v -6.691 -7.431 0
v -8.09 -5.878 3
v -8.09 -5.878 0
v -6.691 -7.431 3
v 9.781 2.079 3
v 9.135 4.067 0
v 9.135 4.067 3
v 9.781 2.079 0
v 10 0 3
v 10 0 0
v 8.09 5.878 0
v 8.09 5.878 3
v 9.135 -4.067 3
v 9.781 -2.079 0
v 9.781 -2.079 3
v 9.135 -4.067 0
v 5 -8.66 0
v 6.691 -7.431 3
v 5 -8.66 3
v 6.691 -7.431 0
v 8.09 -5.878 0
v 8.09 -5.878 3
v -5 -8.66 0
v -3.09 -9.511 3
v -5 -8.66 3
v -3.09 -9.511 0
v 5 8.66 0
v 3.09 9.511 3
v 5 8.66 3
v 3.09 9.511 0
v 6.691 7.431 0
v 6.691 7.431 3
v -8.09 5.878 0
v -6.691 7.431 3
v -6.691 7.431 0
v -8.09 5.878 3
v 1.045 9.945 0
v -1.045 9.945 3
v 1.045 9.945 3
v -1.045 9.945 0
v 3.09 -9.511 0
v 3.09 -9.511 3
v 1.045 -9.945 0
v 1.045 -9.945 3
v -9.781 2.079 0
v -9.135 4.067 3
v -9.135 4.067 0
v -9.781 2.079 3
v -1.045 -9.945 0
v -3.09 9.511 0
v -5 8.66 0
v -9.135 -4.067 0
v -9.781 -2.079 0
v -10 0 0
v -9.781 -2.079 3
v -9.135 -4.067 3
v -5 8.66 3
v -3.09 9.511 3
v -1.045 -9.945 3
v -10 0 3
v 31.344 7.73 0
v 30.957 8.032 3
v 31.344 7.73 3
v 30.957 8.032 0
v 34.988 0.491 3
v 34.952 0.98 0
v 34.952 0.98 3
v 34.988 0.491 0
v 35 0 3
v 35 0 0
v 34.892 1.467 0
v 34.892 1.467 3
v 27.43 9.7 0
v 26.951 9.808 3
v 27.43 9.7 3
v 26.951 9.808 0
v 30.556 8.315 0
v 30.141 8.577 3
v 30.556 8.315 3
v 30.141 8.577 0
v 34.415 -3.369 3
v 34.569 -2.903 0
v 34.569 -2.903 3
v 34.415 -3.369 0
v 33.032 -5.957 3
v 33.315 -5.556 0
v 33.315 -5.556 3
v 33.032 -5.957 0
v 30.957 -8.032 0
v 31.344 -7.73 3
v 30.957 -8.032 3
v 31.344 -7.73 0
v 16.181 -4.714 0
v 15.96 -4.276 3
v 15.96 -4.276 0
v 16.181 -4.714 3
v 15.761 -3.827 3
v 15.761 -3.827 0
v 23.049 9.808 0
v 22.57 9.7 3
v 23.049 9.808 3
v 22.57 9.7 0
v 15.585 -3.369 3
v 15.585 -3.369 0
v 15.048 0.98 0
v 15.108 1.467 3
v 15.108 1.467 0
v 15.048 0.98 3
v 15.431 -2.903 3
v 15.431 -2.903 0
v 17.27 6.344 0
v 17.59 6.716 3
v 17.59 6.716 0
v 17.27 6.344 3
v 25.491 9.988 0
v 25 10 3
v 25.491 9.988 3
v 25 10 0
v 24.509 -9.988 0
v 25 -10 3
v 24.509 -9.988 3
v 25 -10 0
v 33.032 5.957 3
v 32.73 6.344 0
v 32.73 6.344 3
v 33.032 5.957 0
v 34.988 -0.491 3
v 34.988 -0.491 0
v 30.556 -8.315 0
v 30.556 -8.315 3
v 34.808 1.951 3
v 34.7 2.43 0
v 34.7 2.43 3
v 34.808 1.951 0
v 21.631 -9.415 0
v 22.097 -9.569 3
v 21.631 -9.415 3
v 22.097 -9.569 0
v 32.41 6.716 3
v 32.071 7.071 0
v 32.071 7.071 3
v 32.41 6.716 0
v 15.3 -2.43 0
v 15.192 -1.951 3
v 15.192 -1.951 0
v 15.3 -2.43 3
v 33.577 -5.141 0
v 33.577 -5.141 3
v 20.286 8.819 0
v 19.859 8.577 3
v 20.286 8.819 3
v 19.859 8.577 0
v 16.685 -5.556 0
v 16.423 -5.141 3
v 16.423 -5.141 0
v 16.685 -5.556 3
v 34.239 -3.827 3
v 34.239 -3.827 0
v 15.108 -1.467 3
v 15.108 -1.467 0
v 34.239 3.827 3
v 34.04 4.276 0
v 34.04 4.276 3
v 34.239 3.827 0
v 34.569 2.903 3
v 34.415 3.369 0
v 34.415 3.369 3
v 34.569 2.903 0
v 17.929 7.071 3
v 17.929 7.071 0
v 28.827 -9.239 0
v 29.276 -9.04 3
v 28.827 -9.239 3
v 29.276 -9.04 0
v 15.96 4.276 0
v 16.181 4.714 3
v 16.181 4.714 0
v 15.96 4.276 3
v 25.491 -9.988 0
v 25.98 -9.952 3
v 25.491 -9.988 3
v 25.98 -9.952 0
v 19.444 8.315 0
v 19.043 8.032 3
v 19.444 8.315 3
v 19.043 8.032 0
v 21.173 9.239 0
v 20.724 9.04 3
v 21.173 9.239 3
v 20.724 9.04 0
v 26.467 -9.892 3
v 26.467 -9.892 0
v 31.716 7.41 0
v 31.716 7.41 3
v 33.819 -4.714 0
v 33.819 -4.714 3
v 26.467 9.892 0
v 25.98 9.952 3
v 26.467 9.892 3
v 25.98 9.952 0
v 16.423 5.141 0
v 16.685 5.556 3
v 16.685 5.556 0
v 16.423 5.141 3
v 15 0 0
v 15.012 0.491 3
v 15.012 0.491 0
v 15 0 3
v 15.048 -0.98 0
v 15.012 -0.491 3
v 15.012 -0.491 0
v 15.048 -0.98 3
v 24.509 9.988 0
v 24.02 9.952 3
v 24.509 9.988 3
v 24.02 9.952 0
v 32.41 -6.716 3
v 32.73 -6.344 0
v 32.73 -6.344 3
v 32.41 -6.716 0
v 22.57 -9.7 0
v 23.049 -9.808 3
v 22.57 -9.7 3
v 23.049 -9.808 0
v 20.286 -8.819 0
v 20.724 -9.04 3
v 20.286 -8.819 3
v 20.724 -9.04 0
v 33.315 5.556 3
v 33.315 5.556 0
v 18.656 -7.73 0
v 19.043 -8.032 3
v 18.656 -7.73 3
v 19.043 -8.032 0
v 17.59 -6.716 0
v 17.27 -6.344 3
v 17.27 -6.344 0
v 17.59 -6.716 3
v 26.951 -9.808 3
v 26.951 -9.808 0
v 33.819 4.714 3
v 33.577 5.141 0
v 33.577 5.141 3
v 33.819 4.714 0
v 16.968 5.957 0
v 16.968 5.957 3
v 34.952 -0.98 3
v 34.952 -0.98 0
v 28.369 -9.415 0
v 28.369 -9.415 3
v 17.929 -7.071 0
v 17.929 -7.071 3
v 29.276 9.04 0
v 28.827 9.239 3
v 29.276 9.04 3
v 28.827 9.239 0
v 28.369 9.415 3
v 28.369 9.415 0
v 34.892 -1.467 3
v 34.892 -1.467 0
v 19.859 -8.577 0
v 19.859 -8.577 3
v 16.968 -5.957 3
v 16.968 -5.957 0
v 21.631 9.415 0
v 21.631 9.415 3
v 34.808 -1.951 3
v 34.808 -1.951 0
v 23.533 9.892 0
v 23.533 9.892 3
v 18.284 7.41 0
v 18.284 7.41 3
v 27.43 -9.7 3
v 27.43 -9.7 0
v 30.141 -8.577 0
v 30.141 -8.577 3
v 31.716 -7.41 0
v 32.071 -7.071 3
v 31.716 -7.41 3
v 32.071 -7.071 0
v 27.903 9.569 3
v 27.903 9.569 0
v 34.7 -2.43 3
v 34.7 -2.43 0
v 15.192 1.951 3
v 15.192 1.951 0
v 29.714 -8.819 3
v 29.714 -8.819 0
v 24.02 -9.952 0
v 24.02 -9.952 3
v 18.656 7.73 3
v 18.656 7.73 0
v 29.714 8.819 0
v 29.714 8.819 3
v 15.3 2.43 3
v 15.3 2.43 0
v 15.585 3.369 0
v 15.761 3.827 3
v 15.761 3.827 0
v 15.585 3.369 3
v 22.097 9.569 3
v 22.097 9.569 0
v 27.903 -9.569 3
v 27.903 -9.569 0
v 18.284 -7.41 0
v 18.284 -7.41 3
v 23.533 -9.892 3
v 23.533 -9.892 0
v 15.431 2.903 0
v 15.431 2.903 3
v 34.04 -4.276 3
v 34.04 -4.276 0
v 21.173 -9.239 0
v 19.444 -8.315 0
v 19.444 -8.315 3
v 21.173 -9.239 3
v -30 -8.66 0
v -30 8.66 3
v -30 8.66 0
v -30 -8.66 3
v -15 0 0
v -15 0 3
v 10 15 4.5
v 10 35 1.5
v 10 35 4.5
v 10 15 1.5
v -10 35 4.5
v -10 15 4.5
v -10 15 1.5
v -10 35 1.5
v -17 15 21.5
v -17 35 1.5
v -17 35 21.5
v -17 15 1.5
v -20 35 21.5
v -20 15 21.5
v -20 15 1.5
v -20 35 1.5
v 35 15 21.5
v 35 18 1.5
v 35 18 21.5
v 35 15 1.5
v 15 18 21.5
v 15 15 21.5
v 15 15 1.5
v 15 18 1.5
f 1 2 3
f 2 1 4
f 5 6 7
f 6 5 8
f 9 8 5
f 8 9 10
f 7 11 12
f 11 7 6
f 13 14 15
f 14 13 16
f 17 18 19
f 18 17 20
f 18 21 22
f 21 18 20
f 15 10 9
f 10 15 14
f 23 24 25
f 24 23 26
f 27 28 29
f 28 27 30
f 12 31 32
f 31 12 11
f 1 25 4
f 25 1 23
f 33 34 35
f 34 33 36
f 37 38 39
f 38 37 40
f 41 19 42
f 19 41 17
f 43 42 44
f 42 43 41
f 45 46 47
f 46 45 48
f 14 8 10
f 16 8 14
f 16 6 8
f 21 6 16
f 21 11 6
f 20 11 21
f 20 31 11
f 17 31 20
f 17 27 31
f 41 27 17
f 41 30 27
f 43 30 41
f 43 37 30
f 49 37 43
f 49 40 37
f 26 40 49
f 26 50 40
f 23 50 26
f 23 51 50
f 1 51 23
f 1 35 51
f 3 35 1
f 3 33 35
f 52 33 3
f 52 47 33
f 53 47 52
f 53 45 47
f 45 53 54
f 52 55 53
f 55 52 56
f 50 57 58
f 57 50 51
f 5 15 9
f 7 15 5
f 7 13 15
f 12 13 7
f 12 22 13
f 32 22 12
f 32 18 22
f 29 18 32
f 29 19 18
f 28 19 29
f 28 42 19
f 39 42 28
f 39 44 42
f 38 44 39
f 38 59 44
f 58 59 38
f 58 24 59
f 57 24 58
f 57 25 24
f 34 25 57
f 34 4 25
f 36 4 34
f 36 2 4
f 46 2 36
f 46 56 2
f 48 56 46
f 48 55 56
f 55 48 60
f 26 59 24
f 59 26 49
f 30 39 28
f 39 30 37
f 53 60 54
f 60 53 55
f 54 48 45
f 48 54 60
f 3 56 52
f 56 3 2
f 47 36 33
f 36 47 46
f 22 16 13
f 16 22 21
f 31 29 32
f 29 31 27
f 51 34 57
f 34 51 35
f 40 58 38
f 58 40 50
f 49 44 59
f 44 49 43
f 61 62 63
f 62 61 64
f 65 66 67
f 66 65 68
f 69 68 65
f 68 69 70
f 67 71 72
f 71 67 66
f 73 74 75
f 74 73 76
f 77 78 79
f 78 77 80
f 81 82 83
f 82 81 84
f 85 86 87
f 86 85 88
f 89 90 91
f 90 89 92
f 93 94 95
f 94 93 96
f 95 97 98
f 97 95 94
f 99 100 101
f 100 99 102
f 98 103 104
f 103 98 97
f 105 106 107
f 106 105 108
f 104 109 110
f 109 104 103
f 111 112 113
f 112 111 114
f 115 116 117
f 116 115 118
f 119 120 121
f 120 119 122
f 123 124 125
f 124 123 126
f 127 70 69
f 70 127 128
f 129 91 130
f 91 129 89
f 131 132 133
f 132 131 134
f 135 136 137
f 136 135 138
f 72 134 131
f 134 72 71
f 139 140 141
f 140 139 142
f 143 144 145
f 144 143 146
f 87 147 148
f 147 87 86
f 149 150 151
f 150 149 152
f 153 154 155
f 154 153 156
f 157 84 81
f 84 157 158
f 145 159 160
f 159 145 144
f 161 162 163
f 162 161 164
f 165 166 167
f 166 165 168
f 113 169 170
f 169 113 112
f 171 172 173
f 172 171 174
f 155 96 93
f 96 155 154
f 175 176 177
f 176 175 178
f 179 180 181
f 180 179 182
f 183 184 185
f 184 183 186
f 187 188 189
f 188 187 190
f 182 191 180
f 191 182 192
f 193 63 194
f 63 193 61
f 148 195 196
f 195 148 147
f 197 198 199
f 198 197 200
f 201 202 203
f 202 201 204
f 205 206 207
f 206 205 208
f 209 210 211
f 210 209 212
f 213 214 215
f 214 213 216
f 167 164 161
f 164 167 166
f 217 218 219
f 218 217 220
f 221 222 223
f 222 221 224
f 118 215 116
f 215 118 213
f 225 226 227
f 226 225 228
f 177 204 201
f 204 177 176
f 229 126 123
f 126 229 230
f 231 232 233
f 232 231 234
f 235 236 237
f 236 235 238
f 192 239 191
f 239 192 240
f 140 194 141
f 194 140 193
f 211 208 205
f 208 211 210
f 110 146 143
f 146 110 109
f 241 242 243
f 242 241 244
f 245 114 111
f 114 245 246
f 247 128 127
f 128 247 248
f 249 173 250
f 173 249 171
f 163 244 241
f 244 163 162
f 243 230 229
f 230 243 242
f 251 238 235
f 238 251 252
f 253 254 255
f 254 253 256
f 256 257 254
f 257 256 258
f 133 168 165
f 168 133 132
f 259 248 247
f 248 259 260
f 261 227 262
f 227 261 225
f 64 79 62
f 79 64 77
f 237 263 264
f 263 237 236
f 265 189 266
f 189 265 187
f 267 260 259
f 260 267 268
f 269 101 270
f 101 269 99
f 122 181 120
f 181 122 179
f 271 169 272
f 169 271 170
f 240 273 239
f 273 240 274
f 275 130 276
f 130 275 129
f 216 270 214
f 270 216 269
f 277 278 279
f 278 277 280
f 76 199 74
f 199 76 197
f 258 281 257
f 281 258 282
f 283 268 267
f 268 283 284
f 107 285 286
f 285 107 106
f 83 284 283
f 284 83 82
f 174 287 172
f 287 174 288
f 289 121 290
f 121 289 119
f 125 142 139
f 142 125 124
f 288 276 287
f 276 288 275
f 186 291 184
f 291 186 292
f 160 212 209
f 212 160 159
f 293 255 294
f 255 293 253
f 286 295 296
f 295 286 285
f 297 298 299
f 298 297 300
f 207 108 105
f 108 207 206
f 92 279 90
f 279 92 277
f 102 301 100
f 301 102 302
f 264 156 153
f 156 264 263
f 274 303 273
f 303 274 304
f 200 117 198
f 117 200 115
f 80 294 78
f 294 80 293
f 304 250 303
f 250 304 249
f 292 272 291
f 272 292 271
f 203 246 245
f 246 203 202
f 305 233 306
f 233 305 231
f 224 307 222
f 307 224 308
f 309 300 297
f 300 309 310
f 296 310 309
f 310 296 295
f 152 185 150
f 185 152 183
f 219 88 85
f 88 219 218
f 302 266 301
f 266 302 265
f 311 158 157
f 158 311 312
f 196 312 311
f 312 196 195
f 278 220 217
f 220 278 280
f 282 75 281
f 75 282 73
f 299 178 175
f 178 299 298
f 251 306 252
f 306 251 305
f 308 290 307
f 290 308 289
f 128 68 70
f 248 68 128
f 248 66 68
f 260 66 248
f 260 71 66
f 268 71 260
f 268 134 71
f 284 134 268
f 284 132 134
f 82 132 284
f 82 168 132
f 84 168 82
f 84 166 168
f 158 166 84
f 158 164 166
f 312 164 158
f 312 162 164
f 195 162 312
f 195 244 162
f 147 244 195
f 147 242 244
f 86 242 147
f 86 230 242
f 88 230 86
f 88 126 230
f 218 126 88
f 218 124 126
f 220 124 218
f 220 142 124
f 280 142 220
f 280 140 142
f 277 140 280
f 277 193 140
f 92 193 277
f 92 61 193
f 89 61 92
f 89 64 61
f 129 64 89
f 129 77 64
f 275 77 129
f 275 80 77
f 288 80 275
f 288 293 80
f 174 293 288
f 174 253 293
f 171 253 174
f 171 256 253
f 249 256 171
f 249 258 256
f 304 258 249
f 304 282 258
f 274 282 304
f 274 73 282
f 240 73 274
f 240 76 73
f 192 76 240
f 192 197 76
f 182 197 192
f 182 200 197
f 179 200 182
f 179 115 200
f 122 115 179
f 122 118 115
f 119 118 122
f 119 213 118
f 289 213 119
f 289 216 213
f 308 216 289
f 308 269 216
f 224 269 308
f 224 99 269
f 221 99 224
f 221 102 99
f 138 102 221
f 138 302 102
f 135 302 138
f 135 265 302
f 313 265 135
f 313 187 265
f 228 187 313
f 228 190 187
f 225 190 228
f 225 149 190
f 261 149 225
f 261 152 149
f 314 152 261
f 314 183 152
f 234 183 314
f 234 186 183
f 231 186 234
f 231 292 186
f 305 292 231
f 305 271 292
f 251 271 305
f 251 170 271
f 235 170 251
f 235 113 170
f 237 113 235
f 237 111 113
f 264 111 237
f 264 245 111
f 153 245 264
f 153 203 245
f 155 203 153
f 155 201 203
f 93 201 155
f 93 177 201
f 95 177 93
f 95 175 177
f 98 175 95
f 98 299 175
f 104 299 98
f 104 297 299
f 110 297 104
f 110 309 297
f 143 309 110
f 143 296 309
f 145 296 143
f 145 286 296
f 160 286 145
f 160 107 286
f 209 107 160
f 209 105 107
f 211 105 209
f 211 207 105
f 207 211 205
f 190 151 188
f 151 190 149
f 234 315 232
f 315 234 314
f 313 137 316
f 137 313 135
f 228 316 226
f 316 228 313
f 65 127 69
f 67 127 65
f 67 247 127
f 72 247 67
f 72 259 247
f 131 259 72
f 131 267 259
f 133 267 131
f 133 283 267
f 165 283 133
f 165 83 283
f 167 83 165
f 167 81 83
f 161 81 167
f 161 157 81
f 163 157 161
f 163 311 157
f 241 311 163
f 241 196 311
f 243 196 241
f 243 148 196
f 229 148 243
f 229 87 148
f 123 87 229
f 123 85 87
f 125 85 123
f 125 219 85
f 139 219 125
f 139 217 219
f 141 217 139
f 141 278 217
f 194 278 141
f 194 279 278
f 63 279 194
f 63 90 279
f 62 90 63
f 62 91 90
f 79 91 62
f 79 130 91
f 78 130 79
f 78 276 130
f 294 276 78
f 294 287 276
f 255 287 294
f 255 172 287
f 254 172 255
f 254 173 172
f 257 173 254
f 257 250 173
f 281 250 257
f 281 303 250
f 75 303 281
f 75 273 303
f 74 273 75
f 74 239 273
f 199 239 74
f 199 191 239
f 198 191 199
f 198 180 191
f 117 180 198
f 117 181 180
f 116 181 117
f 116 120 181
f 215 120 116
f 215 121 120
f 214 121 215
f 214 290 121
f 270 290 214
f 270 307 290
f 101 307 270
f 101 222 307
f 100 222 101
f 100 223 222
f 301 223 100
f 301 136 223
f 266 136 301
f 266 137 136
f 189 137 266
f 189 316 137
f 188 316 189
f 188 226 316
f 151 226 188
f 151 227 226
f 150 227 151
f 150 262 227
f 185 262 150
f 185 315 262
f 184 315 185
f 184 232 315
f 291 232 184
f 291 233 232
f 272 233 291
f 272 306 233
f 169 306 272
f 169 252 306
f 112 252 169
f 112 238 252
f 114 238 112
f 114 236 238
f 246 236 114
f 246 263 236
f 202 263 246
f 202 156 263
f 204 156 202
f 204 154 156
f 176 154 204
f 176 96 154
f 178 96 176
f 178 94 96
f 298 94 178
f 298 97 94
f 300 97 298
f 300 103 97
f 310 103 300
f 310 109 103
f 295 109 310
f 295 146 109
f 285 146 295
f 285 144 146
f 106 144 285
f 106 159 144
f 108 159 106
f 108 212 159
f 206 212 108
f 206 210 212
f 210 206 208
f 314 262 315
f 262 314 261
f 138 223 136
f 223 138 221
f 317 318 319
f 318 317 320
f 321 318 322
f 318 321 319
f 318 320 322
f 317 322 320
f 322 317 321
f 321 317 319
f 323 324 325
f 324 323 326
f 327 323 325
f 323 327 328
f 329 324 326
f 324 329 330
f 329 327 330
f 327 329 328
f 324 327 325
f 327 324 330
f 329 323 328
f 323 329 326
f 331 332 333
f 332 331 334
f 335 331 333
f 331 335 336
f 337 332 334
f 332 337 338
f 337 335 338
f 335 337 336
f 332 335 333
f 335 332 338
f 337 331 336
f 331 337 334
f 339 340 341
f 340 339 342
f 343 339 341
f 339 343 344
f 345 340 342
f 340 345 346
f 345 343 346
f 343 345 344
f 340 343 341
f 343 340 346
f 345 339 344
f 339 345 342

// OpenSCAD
// basic shapes

// numbers used for size are interpreted by most printers as millimeters
thickness = 3; // variable to create 3mm thick pieces
diameter = 20; // 20mm circles

// $fn is the variable for circles that determine how many 'facets' 
// are displayed.  Default is 10. 128 makes smoother circles
fn = 128;


// default $fn - circle is not super smooth
cylinder(d=20, h=thickness);


// higher $fn - increases rendering time
// translate is used to reposition items on the grid [x,y,z] cordinates
translate([diameter + 5, 0, 0])cylinder(d=20, h=thickness, $fn=fn);


// create an equilateral triangle
translate([-diameter - 5, 0, 0])cylinder(d=20, h=thickness, $fn=3);

// create a square
translate([-diameter/2, diameter/2 + 5, thickness/2])cube([diameter, diameter, thickness]);

// create a square
translate([-diameter, diameter/2 + 5, thickness/2])cube([thickness, diameter, diameter]);

// create a square - with a different orientation
translate([diameter/2 + 5, diameter/2 + 5, thickness/2])cube([diameter, thickness, diameter]);
